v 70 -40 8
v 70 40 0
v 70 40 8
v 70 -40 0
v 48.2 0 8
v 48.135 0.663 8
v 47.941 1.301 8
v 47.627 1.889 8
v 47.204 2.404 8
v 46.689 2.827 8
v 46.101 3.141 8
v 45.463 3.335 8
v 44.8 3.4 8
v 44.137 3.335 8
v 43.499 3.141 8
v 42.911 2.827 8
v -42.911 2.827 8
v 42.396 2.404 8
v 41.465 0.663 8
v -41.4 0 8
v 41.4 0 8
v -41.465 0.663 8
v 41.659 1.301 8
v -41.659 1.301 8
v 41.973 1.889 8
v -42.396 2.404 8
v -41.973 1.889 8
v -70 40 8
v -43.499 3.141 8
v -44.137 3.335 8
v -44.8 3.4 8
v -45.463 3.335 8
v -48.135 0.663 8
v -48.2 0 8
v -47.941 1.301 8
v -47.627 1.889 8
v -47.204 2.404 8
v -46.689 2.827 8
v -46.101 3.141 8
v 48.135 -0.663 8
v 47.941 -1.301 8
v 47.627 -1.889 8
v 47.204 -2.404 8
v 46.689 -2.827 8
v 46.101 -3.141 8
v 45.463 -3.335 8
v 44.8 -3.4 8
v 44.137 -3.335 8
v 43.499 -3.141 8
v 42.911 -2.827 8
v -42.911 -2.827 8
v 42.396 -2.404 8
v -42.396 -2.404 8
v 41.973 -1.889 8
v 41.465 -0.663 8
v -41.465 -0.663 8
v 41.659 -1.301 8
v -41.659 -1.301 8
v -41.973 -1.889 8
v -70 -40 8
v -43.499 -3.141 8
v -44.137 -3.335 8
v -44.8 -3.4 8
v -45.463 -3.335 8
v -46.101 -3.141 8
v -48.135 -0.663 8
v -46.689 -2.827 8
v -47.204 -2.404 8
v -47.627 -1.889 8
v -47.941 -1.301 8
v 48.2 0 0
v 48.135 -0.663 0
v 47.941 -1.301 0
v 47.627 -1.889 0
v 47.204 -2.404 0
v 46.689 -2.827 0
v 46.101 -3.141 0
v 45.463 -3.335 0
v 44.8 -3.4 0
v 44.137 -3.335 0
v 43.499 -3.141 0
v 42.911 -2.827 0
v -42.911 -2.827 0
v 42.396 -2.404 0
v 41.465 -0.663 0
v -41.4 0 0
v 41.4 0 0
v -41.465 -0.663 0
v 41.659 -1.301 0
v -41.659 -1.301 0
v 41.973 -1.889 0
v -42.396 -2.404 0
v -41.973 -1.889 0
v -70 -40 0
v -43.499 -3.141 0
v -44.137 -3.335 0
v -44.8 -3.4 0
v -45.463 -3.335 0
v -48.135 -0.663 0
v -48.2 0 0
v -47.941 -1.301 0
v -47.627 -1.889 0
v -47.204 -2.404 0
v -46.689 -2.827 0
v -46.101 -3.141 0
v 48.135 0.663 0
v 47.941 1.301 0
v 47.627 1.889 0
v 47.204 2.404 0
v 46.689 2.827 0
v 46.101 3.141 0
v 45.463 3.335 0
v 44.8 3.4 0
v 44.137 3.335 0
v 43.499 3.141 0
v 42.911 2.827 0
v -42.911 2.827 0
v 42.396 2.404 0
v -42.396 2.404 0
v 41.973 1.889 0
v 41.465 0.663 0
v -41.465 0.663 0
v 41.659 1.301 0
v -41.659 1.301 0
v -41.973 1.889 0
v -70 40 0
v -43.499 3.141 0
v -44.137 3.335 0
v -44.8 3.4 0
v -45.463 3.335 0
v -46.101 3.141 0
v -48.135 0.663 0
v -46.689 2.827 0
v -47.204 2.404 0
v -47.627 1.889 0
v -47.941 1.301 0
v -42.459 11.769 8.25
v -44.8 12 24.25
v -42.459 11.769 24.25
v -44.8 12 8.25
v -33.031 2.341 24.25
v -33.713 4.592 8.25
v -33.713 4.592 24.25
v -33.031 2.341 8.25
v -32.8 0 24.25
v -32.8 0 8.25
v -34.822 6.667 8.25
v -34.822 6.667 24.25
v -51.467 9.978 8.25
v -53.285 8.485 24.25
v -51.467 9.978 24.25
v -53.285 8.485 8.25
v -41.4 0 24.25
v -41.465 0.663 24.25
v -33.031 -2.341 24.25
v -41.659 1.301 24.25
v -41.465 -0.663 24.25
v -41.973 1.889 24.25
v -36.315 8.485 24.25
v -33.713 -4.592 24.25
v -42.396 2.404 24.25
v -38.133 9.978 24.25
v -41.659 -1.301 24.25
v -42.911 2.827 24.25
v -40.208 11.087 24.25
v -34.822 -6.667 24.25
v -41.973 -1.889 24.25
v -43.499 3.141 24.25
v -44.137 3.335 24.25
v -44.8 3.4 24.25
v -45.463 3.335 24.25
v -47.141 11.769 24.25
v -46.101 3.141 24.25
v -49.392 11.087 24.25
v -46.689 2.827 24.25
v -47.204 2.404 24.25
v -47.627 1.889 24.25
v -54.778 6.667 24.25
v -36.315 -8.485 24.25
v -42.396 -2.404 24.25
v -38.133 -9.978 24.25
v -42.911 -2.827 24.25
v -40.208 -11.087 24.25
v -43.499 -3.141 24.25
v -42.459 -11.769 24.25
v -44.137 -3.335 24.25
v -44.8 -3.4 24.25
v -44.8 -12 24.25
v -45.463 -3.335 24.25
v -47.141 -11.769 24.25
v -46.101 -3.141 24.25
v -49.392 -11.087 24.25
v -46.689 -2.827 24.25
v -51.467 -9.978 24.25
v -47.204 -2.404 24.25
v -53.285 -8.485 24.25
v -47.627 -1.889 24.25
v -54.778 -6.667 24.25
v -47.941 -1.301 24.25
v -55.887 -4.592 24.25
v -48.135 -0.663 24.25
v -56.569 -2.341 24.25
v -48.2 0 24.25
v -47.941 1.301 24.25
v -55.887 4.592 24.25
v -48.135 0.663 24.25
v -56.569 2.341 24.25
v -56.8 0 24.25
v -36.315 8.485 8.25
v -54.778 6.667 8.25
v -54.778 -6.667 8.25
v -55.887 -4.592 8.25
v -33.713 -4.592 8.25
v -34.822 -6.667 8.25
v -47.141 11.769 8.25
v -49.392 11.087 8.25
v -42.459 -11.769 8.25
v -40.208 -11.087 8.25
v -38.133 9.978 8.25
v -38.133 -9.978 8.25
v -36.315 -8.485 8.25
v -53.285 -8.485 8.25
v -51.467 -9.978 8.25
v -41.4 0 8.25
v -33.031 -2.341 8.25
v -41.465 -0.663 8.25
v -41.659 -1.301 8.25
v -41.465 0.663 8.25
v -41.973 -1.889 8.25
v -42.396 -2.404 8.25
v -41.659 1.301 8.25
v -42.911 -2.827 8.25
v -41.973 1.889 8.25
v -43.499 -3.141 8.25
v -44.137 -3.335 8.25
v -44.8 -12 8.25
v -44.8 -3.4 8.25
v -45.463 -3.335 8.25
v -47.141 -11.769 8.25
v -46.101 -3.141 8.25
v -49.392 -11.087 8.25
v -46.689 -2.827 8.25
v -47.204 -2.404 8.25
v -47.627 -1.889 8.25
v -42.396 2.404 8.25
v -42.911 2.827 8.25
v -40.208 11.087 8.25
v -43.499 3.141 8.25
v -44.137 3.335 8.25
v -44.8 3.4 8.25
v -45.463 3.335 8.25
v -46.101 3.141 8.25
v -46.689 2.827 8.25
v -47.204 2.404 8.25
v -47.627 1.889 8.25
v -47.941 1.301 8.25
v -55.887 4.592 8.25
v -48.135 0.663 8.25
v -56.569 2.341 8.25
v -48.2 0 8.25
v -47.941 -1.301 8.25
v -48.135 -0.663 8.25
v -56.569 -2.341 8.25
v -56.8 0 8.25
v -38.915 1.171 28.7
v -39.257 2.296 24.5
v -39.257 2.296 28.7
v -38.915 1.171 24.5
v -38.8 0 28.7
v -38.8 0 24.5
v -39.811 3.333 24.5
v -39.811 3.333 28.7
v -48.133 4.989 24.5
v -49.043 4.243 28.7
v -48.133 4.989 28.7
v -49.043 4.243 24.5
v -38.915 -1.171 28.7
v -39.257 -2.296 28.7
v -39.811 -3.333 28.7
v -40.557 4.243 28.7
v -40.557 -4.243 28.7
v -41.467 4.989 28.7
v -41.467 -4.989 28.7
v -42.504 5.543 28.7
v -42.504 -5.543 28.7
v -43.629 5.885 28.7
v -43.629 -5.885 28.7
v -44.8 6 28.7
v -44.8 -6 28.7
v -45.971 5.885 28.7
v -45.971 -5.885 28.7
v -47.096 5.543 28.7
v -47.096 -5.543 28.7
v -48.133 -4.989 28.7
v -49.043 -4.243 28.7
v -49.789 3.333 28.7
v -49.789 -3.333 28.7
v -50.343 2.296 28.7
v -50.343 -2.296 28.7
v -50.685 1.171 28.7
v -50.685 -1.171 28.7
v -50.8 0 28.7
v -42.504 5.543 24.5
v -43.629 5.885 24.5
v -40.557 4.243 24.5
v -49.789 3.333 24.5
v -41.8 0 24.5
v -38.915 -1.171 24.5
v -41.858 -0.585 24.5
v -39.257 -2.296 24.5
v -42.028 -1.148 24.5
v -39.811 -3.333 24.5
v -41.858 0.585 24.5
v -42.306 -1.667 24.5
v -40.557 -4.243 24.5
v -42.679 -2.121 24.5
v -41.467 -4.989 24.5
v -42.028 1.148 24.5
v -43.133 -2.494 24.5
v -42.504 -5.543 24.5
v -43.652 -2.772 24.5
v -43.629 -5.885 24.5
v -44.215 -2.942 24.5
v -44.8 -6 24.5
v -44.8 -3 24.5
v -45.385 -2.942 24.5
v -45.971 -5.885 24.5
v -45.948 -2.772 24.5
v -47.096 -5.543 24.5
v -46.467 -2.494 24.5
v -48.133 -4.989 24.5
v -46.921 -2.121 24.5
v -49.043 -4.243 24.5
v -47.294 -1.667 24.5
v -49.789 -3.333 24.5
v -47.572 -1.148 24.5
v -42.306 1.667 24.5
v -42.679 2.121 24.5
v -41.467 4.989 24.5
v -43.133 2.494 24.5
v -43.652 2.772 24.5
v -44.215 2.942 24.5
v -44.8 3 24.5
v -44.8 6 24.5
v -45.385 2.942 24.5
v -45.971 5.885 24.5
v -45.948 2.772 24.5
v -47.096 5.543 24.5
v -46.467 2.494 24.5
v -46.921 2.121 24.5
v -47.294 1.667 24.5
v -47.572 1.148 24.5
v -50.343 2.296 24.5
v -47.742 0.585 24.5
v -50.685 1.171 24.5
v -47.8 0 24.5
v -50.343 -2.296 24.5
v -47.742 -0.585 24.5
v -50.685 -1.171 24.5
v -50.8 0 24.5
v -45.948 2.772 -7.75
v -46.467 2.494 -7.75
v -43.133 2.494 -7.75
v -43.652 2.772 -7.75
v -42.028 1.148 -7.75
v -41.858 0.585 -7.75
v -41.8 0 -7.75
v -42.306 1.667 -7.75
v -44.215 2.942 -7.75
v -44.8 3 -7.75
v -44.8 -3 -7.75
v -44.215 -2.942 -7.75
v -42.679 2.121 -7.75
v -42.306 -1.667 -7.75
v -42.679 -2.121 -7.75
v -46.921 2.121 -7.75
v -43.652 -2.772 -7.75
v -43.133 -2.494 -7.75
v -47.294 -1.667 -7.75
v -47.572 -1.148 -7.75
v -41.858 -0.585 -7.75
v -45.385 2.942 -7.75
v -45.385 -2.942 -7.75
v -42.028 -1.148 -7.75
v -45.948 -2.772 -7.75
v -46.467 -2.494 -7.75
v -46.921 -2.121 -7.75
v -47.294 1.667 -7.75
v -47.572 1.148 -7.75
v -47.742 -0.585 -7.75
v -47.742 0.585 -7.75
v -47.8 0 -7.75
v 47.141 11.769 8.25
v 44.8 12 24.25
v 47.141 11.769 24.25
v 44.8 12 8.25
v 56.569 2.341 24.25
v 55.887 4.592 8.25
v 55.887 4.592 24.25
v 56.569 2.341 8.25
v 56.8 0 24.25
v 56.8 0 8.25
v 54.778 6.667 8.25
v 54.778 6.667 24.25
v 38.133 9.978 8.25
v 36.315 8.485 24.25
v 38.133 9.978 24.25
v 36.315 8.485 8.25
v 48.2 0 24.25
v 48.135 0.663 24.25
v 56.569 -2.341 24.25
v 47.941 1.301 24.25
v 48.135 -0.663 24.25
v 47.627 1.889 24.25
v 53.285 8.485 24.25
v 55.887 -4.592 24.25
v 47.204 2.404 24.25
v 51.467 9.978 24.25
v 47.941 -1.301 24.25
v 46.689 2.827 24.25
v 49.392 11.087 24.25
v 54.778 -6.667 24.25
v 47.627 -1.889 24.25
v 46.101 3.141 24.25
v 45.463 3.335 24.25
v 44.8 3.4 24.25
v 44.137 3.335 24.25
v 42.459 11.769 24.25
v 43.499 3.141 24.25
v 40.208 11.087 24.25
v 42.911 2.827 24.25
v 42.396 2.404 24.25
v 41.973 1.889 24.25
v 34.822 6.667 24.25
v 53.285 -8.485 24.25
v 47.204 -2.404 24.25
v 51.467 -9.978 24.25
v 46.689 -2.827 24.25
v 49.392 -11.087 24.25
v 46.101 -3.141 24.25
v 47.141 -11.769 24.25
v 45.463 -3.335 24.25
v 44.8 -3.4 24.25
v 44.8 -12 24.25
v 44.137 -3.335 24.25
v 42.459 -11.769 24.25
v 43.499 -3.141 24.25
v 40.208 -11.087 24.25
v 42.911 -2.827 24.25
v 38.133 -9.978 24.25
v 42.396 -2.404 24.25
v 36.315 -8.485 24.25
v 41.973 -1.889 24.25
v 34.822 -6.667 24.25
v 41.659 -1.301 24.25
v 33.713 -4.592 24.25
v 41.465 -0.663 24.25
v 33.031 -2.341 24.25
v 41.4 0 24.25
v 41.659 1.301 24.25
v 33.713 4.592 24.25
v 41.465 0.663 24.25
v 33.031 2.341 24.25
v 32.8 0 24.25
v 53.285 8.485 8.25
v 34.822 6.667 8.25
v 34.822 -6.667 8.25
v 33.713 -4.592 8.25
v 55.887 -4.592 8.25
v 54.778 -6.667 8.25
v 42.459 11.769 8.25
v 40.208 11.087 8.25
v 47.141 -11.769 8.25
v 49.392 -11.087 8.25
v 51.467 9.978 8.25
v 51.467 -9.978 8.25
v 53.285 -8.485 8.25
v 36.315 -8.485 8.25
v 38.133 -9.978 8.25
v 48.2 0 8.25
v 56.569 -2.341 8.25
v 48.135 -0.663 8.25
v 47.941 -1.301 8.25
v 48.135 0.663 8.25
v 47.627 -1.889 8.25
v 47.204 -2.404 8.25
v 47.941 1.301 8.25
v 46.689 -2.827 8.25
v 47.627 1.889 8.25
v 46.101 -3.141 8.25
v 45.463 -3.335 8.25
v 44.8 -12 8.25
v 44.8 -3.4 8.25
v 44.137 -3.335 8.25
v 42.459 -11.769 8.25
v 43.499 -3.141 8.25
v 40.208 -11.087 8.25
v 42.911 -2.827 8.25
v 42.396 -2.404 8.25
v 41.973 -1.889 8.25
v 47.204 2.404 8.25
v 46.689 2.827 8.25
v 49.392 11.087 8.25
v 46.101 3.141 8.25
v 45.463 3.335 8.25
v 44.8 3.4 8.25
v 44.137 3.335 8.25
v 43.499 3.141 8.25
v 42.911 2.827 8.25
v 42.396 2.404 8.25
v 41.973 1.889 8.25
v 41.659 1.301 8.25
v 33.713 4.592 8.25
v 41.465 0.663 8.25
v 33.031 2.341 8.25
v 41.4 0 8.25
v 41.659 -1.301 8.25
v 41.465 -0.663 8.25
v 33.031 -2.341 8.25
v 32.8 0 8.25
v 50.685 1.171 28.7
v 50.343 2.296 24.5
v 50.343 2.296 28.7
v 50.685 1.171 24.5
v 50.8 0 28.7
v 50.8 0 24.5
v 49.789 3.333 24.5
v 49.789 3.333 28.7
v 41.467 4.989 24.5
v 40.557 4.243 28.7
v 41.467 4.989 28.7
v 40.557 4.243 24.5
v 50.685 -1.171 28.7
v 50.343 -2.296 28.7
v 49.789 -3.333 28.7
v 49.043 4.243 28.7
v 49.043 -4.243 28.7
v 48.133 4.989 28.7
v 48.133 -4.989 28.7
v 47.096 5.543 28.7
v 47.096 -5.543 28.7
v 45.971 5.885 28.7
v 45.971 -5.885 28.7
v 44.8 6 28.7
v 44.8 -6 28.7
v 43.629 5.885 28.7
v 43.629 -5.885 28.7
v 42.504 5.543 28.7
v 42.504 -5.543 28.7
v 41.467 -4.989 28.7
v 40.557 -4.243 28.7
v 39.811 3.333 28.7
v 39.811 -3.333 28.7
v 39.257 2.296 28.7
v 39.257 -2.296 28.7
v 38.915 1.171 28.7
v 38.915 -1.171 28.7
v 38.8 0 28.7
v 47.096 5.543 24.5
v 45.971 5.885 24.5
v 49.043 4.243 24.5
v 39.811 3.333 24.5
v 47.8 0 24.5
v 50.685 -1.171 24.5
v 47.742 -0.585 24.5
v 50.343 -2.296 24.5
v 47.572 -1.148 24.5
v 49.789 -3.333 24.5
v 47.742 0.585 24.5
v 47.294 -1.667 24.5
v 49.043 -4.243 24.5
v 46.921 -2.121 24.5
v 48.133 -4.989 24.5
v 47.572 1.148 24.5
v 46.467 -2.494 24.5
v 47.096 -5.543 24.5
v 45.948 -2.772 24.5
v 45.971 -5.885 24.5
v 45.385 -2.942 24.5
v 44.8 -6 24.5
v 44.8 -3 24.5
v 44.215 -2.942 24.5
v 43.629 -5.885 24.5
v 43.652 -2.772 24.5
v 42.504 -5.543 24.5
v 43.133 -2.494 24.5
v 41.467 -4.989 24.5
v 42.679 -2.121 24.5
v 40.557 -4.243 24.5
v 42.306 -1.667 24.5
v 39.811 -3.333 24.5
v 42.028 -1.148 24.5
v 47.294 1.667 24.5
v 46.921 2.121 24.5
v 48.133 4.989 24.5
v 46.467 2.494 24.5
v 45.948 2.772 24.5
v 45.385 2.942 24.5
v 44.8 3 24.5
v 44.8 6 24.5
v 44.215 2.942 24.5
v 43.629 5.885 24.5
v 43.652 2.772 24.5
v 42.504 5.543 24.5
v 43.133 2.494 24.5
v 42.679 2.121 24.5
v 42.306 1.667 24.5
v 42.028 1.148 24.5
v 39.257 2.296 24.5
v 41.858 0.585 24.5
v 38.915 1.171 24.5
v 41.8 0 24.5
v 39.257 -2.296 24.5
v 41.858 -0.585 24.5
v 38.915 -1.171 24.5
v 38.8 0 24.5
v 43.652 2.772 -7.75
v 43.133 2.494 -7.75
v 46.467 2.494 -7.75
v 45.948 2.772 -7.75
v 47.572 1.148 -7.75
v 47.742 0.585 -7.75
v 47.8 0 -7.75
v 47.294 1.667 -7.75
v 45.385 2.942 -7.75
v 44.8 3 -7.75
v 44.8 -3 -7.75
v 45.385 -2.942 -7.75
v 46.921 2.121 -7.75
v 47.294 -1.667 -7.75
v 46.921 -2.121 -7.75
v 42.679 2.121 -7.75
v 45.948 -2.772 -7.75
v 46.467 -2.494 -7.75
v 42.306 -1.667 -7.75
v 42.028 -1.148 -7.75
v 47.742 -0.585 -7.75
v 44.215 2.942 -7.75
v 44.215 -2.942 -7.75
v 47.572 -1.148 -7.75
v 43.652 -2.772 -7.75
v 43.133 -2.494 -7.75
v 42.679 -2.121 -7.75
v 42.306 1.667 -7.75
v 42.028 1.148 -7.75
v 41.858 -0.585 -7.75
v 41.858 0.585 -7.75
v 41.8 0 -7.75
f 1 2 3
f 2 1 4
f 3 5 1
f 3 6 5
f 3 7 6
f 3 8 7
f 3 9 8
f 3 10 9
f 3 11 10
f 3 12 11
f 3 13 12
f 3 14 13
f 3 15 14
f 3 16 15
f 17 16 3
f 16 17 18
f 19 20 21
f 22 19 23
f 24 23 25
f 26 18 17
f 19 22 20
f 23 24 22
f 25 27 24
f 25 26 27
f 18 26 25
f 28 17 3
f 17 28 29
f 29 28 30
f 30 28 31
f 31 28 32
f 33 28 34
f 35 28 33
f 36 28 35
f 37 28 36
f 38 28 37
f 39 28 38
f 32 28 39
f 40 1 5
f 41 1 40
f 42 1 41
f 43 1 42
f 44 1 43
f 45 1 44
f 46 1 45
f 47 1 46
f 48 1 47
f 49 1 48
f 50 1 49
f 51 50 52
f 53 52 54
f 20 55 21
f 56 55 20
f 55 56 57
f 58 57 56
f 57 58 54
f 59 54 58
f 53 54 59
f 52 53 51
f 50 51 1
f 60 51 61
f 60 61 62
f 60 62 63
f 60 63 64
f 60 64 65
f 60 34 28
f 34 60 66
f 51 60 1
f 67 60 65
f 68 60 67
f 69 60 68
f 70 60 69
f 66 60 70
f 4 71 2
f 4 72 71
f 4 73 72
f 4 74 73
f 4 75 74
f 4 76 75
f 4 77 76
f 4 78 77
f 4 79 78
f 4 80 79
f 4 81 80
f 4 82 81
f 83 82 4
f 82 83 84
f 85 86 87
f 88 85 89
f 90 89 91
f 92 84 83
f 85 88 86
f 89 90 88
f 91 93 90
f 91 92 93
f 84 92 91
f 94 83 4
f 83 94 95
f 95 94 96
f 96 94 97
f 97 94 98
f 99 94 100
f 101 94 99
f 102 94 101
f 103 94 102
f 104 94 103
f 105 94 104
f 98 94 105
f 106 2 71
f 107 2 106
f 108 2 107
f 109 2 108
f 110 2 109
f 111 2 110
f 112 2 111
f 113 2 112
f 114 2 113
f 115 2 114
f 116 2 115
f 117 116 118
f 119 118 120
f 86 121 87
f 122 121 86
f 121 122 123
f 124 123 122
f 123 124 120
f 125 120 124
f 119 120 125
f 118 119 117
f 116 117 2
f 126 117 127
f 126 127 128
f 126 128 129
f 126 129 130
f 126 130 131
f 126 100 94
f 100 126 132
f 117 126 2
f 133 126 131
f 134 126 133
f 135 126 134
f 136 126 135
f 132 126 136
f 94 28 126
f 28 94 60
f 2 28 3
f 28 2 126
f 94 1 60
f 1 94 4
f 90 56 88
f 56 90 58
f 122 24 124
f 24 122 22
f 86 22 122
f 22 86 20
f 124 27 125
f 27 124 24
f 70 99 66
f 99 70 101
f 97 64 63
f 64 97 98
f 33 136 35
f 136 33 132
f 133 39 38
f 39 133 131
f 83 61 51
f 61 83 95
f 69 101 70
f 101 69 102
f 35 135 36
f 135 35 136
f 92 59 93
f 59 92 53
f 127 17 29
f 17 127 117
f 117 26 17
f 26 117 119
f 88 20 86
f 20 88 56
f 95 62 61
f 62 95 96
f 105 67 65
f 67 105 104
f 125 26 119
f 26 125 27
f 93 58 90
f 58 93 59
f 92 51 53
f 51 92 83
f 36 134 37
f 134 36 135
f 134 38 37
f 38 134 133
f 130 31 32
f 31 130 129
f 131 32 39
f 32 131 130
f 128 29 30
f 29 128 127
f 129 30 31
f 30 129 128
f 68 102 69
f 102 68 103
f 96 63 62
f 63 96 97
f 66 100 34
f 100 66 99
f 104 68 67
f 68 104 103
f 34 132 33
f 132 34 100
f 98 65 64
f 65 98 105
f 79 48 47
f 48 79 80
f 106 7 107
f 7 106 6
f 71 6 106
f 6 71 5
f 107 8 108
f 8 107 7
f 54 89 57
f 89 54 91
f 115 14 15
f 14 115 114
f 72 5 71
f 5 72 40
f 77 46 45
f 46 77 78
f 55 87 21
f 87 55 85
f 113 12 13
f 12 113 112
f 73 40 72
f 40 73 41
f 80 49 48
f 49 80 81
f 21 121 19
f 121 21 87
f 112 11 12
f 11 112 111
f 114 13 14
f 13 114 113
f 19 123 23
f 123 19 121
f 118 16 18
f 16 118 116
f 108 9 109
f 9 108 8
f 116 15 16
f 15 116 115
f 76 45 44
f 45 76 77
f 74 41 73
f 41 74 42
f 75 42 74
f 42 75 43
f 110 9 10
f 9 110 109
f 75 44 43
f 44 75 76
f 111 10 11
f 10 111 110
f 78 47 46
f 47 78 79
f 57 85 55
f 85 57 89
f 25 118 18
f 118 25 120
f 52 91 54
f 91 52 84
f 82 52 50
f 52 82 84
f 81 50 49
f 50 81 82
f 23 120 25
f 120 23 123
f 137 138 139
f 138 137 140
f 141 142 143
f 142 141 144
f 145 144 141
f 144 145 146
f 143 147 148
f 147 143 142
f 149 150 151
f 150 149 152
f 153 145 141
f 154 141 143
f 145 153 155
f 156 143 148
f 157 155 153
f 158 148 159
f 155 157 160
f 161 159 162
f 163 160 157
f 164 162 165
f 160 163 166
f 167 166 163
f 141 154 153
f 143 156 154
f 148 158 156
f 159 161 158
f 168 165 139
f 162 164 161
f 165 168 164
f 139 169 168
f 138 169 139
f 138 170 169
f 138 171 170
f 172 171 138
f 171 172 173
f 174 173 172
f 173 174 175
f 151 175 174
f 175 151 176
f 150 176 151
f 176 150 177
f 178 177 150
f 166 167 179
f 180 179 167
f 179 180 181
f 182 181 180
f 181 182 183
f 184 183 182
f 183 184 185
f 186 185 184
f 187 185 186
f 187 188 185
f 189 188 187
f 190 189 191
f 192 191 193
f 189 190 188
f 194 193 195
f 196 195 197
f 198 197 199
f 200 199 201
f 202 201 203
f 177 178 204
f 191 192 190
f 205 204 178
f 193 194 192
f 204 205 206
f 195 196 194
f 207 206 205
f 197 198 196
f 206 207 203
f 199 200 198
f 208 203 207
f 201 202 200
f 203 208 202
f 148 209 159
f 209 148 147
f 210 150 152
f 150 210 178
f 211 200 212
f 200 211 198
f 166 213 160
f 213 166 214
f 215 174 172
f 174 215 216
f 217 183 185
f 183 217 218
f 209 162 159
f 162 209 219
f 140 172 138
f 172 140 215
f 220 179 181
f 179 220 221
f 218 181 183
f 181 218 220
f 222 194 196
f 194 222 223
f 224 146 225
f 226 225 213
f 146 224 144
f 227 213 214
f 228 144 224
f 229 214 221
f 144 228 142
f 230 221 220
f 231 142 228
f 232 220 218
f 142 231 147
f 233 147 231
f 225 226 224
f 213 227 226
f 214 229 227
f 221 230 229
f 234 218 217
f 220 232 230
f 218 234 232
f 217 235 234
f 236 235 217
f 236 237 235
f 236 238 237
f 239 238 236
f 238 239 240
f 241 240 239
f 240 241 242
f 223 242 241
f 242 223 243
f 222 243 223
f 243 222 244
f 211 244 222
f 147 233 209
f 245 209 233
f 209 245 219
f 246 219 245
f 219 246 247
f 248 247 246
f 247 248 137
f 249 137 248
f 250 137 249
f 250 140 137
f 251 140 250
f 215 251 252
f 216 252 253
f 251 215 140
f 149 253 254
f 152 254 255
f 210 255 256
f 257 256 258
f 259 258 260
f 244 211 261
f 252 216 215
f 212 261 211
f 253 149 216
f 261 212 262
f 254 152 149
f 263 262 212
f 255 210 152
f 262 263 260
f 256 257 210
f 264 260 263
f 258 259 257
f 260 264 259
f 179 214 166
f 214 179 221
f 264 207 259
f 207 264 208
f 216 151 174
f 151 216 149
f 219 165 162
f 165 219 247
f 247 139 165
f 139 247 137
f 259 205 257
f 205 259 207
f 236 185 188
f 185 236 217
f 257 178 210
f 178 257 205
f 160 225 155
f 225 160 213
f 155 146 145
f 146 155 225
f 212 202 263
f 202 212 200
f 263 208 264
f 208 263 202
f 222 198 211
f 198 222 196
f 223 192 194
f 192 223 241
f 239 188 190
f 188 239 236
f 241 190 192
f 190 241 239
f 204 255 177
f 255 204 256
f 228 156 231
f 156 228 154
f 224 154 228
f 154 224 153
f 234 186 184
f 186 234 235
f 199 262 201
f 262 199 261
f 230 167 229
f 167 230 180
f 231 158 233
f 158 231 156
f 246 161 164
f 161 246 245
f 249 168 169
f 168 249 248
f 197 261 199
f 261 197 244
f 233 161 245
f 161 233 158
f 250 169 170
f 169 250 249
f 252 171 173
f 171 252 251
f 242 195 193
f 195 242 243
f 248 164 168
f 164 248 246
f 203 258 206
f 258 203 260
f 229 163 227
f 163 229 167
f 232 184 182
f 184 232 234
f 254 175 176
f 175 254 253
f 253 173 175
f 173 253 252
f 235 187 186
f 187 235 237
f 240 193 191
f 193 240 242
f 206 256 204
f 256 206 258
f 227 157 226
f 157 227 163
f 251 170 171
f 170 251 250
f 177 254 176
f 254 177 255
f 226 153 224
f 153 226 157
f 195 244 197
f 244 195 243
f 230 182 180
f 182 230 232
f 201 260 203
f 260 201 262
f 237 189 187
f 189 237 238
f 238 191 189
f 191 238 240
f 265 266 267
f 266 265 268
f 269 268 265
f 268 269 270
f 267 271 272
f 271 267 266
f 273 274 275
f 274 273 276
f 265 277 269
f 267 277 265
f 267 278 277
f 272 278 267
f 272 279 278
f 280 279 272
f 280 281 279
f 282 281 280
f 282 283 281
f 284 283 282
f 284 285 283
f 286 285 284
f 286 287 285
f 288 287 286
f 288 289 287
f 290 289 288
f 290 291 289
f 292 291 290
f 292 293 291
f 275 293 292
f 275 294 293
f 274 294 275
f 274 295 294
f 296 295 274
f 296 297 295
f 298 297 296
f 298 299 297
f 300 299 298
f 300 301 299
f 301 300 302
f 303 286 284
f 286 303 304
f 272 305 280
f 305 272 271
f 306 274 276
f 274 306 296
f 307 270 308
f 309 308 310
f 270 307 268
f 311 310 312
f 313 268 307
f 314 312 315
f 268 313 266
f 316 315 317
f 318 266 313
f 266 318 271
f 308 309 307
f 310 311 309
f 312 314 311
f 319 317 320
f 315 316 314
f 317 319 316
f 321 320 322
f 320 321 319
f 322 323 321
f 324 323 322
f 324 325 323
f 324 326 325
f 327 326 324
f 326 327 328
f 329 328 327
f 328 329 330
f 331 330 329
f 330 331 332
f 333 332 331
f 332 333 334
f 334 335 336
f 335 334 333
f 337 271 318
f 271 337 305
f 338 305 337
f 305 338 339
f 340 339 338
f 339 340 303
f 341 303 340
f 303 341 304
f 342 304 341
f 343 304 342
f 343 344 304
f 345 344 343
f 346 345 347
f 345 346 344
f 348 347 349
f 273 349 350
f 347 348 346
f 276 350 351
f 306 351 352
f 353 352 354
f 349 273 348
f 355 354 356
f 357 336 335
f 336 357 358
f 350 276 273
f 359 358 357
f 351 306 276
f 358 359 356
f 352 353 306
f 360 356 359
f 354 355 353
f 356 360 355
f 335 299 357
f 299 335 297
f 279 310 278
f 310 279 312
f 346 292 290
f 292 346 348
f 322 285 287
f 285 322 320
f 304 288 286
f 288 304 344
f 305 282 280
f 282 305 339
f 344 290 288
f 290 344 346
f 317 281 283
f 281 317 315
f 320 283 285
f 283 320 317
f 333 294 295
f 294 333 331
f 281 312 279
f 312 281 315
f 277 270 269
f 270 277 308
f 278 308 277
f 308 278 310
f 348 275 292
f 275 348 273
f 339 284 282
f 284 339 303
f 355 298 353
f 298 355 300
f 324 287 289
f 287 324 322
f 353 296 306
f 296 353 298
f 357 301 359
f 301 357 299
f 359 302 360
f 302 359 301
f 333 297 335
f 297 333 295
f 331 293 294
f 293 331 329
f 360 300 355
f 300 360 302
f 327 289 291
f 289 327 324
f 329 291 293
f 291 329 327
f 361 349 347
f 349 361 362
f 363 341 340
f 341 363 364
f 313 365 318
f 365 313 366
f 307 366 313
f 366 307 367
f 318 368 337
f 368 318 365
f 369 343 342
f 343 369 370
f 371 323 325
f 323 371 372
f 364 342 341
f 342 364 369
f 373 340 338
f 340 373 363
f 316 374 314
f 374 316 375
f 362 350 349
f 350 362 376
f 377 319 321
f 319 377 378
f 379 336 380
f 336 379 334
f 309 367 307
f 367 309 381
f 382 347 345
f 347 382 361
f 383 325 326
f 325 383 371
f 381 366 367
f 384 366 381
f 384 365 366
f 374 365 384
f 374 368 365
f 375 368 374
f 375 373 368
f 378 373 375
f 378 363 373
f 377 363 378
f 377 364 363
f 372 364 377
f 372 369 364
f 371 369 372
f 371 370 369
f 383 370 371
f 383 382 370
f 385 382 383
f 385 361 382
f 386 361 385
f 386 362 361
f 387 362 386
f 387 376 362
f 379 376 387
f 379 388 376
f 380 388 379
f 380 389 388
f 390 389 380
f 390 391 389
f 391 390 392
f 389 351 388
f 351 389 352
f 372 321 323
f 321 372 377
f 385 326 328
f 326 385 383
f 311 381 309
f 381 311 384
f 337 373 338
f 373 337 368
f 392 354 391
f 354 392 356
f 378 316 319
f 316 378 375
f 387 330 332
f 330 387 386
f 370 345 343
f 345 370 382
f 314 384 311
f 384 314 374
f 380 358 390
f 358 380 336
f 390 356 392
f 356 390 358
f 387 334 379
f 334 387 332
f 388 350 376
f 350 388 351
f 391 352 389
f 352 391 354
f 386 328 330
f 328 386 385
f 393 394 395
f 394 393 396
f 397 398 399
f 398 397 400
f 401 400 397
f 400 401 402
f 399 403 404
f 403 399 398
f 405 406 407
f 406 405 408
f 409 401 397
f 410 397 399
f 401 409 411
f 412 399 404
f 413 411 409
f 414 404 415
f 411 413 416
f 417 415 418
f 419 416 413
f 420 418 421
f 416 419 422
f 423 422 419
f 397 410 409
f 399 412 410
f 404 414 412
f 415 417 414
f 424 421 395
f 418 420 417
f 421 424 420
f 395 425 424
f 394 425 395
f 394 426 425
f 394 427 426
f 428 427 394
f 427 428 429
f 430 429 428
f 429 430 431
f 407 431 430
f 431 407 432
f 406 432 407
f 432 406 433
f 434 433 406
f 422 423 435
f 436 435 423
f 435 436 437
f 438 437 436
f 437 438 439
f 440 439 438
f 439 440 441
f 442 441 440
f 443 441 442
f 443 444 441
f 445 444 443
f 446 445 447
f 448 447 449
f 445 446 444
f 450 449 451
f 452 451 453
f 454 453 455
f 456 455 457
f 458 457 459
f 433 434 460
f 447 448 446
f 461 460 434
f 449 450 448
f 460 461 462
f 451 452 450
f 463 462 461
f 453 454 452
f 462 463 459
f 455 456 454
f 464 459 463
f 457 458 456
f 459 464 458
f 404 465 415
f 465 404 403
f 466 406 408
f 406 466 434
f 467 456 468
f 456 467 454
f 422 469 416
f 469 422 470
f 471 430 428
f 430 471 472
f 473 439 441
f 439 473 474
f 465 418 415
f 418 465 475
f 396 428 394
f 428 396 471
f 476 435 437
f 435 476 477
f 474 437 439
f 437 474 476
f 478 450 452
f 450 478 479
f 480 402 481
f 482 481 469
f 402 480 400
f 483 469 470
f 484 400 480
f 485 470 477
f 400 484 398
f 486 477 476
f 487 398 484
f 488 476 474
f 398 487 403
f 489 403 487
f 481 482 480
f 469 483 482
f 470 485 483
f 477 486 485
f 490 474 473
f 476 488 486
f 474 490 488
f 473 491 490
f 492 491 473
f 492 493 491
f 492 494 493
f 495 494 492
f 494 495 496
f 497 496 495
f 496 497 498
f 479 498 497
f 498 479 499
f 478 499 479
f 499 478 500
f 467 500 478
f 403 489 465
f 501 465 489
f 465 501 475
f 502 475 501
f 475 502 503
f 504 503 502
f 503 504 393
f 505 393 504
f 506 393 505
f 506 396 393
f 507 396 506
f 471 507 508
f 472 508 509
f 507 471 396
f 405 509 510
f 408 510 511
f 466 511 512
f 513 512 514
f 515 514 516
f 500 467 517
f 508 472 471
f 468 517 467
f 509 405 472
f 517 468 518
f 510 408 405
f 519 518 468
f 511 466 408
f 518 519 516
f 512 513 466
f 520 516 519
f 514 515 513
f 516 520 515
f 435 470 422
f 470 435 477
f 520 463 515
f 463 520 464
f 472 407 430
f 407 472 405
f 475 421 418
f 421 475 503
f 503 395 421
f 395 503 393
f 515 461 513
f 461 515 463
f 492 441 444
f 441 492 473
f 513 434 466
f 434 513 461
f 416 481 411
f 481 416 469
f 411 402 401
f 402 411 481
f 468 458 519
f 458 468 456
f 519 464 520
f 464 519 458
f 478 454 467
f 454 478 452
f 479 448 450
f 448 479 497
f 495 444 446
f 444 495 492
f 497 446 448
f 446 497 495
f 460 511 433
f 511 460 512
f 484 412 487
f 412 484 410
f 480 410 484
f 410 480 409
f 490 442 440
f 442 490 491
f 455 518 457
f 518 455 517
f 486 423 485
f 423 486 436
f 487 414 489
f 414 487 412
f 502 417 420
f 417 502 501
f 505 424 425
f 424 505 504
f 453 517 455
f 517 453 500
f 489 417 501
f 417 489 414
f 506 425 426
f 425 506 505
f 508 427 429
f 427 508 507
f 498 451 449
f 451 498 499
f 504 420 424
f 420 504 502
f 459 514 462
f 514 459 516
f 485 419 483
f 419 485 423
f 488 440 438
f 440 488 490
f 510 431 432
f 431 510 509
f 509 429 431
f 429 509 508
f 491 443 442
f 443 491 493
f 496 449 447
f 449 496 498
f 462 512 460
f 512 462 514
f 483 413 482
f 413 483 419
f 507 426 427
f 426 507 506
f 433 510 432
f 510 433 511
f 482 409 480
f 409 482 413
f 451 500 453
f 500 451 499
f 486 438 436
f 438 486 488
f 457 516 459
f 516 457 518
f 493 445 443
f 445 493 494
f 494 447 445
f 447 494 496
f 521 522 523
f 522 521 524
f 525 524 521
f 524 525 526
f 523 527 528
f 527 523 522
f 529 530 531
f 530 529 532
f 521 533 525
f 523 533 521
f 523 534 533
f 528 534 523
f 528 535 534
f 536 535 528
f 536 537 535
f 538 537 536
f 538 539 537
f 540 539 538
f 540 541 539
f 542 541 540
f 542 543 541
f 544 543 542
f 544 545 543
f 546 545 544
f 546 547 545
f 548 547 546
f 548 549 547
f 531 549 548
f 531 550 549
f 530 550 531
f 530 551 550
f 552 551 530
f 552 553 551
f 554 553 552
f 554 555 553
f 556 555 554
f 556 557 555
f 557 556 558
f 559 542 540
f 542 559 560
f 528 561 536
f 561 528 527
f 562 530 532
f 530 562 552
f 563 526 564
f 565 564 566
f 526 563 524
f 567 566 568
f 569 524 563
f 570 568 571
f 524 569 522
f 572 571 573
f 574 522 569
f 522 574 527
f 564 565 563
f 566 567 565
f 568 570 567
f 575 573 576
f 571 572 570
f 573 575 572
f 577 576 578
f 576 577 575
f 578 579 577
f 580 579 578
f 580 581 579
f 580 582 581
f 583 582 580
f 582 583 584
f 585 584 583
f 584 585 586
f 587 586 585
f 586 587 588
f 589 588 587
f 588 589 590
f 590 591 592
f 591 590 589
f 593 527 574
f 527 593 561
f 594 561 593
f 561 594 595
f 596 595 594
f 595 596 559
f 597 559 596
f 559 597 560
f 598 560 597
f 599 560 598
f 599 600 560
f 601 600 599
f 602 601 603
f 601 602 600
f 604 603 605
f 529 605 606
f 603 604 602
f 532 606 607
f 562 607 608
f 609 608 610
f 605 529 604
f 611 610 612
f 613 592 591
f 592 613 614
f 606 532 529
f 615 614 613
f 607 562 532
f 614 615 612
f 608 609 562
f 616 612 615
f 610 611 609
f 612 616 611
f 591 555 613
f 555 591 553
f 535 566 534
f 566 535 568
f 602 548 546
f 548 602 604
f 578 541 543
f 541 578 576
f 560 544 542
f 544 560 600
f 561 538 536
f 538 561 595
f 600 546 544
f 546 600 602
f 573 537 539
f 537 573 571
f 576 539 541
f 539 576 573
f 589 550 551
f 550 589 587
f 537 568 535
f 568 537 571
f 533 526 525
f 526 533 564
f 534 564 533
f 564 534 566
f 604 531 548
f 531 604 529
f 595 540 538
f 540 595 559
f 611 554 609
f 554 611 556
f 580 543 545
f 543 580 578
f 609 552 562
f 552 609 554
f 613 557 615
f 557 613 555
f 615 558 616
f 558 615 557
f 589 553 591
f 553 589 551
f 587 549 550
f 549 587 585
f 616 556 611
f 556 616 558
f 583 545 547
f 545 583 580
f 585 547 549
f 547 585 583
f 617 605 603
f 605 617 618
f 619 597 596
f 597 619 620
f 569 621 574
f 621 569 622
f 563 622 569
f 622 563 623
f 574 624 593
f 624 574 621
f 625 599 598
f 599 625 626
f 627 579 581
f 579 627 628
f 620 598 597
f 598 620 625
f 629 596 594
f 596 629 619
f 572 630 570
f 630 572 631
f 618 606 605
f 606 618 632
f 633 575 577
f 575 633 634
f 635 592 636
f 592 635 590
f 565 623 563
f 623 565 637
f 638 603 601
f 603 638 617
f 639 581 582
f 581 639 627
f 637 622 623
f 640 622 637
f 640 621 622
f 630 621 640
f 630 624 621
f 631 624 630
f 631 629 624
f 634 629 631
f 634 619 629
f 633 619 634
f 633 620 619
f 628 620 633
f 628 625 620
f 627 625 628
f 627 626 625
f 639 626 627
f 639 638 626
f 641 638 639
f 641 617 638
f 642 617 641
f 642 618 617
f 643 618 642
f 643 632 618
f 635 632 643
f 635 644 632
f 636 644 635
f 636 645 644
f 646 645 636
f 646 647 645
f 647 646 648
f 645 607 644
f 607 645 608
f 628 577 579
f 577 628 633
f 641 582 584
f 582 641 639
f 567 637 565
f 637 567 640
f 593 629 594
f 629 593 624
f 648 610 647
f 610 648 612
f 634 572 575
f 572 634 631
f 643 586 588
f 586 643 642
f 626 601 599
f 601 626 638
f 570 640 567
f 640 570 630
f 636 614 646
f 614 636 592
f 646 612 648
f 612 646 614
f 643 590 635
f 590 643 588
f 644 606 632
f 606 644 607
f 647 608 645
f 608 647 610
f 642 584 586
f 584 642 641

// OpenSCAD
$fn = 32;

// ------------------------------------------------------------------------
// Standoff columns: 2 d24 standoffs, bolts d6
// Every part is its own module, assembly() places them once.
// ------------------------------------------------------------------------

// --- part 1 ---
module base_plate() {
  difference() {
    translate([-70, -40, 0]) cube([140, 80, 8]);
    translate([-44.8, 0, -1]) cylinder(h = 10, d = 6.8);
    translate([44.8, 0, -1]) cylinder(h = 10, d = 6.8);
  }
}

// --- part 2 ---
module spacer1() {
  difference() {
      translate([0, 0, 0]) cylinder(h = 16, d = 24);
      translate([0, 0, -1]) cylinder(h = 18, d = 6.8);
    }
}

// --- part 3 ---
module bolt1() {
  cylinder(h = 4.2, d = 12);
  translate([0, 0, -32.25]) cylinder(h = 32.25, d = 6);
}

// --- part 4 ---
module spacer2() {
  difference() {
      translate([0, 0, 0]) cylinder(h = 16, d = 24);
      translate([0, 0, -1]) cylinder(h = 18, d = 6.8);
    }
}

// --- part 5 ---
module bolt2() {
  cylinder(h = 4.2, d = 12);
  translate([0, 0, -32.25]) cylinder(h = 32.25, d = 6);
}

// --- assembly ---
module assembly() {
  translate([0, 0, 0]) rotate([0, 0, 0]) base_plate();
  translate([-44.8, 0, 8.25]) rotate([0, 0, 0]) spacer1();
  translate([-44.8, 0, 24.5]) rotate([0, 0, 0]) bolt1();
  translate([44.8, 0, 8.25]) rotate([0, 0, 0]) spacer2();
  translate([44.8, 0, 24.5]) rotate([0, 0, 0]) bolt2();
}

assembly();
